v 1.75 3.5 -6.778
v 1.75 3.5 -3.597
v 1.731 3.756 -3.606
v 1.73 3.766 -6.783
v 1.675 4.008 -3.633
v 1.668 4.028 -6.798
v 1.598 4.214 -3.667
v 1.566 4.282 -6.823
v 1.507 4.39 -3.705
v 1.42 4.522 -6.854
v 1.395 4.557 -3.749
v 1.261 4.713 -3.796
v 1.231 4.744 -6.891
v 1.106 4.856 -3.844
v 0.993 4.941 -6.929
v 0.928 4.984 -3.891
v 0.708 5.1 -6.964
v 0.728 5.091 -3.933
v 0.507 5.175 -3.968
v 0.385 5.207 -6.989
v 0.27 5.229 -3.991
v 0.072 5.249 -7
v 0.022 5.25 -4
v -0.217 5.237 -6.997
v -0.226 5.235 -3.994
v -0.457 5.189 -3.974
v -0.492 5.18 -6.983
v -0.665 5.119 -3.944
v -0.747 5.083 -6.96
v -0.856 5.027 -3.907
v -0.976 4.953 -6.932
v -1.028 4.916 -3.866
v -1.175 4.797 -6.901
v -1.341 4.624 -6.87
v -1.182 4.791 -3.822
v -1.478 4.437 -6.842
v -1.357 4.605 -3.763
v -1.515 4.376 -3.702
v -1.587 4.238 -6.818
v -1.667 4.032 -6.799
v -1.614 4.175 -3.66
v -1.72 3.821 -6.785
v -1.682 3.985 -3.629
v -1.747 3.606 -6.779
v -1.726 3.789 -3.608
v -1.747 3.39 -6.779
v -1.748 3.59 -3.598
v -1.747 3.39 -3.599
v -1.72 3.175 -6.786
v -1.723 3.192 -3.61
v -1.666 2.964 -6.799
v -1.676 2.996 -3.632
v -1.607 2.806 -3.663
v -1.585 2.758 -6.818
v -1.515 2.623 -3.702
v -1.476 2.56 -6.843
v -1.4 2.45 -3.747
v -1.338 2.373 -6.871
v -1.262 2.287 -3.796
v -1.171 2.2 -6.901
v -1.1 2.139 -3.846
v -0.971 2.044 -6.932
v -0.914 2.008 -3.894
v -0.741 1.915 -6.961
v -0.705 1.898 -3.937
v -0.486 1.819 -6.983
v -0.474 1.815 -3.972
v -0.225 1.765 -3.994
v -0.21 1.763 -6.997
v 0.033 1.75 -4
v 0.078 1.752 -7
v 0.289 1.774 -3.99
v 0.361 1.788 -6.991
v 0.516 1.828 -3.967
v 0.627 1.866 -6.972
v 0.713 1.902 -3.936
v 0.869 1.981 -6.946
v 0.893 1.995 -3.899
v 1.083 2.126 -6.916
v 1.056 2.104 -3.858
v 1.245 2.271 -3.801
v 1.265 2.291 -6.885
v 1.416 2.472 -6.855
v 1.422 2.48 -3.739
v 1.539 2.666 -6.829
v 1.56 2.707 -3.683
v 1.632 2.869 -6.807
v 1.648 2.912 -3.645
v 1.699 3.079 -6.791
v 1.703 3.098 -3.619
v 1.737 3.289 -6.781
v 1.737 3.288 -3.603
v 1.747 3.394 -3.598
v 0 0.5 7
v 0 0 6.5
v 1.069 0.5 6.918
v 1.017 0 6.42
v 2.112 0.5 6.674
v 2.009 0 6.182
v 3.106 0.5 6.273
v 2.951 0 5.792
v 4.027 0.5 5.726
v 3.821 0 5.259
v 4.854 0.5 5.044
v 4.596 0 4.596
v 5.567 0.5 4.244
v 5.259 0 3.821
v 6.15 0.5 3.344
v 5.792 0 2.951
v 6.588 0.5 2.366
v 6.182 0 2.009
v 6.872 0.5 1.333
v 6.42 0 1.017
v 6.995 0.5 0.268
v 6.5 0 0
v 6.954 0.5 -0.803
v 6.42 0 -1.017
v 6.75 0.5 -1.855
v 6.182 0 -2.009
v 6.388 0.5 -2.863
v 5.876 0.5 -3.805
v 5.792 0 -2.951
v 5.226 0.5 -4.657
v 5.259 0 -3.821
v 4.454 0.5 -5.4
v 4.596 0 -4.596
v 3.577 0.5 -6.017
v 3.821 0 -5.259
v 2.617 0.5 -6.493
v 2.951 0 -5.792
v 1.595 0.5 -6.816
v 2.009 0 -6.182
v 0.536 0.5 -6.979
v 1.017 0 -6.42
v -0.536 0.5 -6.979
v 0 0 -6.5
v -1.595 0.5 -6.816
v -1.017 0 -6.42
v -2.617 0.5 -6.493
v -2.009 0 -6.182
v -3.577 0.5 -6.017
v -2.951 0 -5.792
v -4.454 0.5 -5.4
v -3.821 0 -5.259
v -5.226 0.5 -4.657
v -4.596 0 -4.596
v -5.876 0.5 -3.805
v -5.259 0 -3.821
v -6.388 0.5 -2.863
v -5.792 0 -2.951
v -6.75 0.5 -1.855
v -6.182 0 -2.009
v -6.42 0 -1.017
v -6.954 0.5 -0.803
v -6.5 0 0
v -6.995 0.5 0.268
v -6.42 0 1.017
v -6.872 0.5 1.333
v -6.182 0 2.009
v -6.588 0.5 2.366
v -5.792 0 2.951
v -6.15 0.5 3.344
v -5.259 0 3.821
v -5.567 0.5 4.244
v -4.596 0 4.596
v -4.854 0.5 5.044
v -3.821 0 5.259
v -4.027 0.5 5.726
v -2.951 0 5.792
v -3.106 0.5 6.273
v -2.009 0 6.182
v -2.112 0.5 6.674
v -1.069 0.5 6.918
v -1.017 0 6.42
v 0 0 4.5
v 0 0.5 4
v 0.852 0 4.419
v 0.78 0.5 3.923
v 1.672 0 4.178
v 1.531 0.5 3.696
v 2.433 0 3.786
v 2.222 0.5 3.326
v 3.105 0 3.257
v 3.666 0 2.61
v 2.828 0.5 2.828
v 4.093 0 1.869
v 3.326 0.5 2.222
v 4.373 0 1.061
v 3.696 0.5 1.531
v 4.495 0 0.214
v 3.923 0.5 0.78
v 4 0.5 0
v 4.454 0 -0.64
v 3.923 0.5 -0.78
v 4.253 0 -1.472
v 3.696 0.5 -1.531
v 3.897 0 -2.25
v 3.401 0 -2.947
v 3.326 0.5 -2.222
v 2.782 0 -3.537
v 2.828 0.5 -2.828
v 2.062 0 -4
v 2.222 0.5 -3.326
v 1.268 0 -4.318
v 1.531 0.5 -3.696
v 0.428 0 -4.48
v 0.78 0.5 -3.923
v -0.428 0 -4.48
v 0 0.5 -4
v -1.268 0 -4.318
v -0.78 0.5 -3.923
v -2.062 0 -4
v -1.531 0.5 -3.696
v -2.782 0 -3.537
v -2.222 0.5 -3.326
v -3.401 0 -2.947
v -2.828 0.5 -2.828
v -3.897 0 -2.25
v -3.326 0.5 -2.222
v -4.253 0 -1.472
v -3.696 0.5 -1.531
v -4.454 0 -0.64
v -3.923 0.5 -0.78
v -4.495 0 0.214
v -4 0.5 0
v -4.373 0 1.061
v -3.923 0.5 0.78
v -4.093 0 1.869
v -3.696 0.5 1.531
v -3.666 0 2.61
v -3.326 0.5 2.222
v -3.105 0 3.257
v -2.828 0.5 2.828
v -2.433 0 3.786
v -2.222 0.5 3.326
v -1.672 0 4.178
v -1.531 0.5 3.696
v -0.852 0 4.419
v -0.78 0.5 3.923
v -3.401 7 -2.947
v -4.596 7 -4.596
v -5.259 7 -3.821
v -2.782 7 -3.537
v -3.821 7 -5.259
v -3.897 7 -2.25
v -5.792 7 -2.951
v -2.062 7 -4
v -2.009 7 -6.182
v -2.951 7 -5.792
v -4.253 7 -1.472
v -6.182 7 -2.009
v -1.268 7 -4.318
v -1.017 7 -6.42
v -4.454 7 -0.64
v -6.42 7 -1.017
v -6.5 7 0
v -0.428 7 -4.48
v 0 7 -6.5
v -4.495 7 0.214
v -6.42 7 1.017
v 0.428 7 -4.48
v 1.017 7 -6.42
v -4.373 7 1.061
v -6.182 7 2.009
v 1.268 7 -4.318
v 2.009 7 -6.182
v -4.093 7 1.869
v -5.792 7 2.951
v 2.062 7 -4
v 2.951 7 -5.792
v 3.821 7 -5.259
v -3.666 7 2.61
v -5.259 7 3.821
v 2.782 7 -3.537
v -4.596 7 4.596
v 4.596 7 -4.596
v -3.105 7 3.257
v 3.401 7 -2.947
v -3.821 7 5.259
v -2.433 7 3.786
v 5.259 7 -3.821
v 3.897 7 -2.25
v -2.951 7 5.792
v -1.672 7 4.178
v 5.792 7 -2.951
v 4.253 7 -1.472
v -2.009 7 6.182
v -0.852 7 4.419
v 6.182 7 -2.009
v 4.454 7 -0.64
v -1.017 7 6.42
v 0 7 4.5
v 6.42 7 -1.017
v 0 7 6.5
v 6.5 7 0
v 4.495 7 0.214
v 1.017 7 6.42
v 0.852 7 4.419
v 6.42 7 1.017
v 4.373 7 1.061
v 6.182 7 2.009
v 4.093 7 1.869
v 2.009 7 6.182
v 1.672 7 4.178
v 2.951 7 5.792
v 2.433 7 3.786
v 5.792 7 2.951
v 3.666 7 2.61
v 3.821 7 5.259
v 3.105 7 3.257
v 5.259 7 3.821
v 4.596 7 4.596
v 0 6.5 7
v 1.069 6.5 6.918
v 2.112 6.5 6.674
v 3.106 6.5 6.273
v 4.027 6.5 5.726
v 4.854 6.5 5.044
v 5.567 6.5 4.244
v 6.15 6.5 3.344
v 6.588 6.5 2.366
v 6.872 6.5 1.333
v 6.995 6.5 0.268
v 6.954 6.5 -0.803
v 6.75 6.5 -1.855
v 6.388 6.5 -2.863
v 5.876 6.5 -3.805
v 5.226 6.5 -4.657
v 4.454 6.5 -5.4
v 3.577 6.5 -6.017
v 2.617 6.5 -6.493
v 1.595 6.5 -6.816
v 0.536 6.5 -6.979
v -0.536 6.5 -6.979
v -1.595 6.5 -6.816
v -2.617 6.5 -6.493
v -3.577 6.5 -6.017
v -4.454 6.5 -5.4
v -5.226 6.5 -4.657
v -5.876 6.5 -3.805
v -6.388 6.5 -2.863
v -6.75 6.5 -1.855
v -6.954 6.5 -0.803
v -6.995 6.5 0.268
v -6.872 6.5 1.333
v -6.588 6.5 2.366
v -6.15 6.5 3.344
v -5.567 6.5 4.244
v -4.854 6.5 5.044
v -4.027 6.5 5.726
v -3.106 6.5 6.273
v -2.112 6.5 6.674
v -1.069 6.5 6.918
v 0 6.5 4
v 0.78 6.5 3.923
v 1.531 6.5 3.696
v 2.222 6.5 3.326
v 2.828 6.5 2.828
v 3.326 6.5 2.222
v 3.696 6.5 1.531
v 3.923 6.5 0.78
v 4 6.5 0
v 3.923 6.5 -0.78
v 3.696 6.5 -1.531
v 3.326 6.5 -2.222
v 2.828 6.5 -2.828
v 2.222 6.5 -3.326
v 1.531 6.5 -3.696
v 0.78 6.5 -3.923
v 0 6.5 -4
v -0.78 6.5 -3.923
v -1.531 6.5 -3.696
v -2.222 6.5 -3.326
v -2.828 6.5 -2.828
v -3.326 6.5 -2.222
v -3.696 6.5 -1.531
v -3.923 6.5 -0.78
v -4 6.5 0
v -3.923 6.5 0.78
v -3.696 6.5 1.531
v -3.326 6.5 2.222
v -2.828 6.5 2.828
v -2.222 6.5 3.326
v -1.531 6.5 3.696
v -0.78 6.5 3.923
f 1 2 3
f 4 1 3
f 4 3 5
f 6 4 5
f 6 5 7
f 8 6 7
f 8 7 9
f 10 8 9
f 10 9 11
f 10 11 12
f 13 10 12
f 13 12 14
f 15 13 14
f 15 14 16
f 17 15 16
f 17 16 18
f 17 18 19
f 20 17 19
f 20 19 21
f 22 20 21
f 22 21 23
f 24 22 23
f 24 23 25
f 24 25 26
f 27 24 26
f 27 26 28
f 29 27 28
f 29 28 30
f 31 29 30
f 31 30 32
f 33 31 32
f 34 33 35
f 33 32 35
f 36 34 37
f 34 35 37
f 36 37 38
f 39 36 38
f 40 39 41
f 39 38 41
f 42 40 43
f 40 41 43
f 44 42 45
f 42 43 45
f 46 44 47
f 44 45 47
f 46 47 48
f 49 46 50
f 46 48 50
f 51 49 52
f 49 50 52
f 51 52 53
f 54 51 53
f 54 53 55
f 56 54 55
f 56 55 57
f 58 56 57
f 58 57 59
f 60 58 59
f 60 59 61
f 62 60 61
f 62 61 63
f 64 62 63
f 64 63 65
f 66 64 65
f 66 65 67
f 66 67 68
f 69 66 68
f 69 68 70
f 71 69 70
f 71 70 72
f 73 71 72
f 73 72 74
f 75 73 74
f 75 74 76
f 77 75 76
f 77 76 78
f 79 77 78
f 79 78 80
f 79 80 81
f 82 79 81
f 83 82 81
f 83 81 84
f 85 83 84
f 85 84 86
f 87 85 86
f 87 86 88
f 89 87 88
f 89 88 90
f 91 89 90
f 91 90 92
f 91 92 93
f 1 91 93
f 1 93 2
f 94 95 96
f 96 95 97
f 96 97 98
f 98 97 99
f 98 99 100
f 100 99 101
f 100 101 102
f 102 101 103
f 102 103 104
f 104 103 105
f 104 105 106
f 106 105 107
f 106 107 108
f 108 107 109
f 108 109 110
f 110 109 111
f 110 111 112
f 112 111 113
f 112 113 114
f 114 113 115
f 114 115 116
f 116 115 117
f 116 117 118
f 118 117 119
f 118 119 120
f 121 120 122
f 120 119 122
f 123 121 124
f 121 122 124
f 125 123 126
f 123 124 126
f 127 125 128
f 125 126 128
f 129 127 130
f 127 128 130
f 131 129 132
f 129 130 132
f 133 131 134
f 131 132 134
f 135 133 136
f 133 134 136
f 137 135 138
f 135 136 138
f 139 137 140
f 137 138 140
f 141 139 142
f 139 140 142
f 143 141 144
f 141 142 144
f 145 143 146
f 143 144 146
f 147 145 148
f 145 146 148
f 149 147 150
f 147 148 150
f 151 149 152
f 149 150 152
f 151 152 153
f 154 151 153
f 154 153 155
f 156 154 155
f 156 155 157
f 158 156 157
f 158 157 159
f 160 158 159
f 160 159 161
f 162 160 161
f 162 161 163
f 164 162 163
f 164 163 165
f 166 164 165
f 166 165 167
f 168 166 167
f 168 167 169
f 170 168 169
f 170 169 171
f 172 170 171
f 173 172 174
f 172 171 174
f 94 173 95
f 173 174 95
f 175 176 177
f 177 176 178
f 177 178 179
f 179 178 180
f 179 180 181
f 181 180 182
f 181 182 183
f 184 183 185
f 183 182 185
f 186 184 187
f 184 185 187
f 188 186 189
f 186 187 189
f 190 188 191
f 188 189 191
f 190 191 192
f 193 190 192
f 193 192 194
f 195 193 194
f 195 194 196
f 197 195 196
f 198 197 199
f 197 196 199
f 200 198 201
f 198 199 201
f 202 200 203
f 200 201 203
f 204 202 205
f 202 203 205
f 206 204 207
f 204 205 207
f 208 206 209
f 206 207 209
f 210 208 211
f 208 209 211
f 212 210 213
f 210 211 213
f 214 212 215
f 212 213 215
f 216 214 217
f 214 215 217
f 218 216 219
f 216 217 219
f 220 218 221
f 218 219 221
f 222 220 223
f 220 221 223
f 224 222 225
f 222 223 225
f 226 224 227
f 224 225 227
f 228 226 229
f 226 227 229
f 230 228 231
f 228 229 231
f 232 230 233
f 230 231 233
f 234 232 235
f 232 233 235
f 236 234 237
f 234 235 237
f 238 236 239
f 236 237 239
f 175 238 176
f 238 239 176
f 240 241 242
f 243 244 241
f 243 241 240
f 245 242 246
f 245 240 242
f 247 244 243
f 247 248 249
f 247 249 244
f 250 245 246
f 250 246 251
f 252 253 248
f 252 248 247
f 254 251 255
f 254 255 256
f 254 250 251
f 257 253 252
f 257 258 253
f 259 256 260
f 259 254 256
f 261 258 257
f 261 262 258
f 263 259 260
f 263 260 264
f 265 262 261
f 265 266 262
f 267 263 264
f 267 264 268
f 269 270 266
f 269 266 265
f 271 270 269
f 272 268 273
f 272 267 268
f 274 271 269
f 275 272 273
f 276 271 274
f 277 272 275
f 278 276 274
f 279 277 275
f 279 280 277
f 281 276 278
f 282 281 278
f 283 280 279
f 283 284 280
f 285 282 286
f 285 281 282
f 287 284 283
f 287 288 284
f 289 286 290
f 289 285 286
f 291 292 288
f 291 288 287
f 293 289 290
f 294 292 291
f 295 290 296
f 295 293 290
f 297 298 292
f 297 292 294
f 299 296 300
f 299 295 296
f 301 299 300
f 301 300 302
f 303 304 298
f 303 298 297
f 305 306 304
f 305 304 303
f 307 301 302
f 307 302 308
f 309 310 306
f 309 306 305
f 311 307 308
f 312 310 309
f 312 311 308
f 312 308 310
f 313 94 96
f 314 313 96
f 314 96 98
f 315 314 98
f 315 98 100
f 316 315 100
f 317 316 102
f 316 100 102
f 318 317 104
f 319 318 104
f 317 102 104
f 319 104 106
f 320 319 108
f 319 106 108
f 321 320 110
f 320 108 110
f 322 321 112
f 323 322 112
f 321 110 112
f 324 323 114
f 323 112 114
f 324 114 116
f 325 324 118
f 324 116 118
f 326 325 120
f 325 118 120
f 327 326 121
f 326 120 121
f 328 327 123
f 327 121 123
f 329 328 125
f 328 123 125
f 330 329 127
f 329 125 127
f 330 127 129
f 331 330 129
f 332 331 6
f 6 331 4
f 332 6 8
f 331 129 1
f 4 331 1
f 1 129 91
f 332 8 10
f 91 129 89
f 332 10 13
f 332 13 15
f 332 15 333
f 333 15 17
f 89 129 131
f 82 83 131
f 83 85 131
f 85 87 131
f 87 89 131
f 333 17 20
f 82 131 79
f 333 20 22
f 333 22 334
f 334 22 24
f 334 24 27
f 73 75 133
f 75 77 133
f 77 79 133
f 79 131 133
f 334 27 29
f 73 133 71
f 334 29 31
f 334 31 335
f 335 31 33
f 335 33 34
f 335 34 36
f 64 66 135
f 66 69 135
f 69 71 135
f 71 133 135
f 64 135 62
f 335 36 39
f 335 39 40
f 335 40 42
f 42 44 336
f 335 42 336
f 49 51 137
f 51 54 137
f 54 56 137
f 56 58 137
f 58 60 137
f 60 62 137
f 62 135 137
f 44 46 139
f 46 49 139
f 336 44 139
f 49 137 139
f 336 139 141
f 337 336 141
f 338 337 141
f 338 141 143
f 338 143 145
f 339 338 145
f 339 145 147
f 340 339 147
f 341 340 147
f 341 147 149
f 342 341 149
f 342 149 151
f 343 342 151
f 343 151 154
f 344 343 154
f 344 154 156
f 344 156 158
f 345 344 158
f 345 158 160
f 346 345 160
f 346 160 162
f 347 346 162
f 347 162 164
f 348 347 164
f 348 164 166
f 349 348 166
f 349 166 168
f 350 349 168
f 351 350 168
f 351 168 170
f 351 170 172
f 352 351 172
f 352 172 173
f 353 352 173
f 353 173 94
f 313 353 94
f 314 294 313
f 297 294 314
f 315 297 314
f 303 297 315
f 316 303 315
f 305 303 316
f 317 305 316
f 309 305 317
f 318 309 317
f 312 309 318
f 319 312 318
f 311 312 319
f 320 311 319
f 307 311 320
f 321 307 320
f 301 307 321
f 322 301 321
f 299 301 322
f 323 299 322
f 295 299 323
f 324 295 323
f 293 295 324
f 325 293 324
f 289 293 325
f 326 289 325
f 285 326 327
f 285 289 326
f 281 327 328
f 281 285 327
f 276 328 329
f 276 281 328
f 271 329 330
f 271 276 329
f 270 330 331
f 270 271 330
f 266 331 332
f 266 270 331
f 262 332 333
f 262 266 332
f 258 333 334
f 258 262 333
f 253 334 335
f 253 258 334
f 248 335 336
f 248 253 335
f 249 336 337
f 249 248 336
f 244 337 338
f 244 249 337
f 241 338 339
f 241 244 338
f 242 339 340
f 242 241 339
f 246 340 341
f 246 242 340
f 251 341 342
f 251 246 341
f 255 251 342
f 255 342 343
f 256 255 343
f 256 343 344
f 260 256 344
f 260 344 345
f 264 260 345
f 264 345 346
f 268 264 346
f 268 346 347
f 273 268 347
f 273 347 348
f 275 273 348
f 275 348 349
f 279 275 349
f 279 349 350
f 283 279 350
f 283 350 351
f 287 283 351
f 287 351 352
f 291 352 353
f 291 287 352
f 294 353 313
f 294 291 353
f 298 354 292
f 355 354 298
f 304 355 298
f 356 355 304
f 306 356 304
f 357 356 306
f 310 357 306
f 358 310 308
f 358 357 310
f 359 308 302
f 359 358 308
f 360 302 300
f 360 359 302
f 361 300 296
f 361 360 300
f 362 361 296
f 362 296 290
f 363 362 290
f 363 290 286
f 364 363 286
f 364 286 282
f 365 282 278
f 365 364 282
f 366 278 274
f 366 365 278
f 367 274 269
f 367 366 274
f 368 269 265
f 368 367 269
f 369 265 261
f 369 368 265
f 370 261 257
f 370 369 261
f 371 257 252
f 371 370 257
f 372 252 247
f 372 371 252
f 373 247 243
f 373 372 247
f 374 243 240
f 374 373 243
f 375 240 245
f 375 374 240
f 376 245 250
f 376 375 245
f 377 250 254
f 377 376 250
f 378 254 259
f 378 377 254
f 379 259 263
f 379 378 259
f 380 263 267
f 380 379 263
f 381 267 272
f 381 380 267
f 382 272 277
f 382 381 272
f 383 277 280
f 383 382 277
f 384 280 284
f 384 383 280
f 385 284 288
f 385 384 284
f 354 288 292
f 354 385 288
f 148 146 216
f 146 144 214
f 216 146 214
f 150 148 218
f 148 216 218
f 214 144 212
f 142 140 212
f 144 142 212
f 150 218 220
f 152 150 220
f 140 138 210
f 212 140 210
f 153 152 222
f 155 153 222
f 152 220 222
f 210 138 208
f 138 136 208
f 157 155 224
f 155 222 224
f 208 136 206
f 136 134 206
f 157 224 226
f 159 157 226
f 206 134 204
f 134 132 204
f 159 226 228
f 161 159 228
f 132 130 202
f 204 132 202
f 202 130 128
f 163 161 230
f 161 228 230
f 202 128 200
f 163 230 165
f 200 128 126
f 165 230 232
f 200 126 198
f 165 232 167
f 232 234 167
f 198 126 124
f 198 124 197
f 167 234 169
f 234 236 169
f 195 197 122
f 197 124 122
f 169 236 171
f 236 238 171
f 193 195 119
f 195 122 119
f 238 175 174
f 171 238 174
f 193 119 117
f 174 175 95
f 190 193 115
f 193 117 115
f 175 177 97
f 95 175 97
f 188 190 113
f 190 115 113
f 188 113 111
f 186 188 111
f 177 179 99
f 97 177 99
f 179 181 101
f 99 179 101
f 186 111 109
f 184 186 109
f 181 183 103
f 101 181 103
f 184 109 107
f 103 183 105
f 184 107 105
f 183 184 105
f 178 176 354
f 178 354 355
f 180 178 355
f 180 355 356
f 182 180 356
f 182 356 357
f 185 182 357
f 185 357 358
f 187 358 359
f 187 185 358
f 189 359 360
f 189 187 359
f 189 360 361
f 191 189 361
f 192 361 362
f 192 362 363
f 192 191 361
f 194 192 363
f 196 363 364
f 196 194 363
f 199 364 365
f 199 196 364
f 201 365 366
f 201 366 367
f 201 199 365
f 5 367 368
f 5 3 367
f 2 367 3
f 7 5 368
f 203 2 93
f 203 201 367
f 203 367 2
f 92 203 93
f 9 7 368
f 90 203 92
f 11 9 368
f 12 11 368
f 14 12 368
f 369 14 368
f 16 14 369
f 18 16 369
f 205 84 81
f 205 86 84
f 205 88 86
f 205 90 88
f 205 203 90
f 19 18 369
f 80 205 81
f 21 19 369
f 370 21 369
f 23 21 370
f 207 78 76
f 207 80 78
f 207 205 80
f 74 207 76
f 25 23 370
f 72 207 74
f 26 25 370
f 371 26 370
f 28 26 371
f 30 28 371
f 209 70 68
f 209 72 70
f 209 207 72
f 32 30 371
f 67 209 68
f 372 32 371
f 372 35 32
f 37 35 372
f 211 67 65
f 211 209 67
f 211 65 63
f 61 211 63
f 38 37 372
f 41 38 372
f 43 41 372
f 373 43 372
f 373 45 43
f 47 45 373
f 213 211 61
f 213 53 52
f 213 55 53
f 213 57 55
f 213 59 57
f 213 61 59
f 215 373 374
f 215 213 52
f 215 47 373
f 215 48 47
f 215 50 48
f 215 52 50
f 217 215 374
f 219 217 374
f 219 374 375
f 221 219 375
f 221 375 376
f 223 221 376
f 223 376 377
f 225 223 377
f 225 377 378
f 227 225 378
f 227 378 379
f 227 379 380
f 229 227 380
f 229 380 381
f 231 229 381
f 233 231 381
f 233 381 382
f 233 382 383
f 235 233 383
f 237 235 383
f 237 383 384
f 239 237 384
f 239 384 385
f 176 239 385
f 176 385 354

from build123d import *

# Parameters (mm, degrees)
SKETCH1_R               = 7
SKETCH1_R_2             = 4
BOSS_EXTRUDE1_DEPTH     = 7
CUT_EXTRUDE1_REACH      = 14.124
CUT_EXTRUDE1_END_RADIUS = 7
SKETCH2_R               = 1.75
CHAMFER1_SIZE           = 0.5


with BuildPart() as part:
    # Sketch1 → Boss-Extrude1 (new body)
    with BuildSketch(Plane(origin=(0, 0, 0), x_dir=(1, 0, 0), z_dir=(0, 1, 0))):
        with Locations(Location((0, 0, 0), (0, 0, 270))):
            Circle(SKETCH1_R)
        with Locations(Location((0, 0, 0), (0, 0, 270))):
            Circle(SKETCH1_R_2, mode=Mode.SUBTRACT)
    extrude(amount=BOSS_EXTRUDE1_DEPTH)

    # Cut-Extrude1: up to this cylinder (the profile starts inside it)
    cut_extrude1_end = Plane(origin=(0, 3.5, 0), z_dir=(0, -1, 0)) * Cylinder(CUT_EXTRUDE1_END_RADIUS, 43.248, mode=Mode.PRIVATE)
    # Sketch2 → Cut-Extrude1 (cut, up to the surface)
    with BuildSketch(Plane.XY, mode=Mode.PRIVATE) as cut_extrude1_sk1:
        with Locations((0, 3.5)):
            Circle(SKETCH2_R)
    cut_extrude1_tool1 = extrude(cut_extrude1_sk1.sketch, amount=-CUT_EXTRUDE1_REACH, mode=Mode.PRIVATE) & cut_extrude1_end
    add(cut_extrude1_tool1.solids().sort_by_distance((0, 3.5, 0))[0], mode=Mode.SUBTRACT)

    # Chamfer1
    chamfer1_edges = [part.edges().sort_by_distance(p)[0] for p in [
        (0, 0, -7),
        (0, 7, -7),
        (0, 0, -4),
        (0, 7, -4),
    ]]
    chamfer(chamfer1_edges, length=CHAMFER1_SIZE)


solid = part.part
